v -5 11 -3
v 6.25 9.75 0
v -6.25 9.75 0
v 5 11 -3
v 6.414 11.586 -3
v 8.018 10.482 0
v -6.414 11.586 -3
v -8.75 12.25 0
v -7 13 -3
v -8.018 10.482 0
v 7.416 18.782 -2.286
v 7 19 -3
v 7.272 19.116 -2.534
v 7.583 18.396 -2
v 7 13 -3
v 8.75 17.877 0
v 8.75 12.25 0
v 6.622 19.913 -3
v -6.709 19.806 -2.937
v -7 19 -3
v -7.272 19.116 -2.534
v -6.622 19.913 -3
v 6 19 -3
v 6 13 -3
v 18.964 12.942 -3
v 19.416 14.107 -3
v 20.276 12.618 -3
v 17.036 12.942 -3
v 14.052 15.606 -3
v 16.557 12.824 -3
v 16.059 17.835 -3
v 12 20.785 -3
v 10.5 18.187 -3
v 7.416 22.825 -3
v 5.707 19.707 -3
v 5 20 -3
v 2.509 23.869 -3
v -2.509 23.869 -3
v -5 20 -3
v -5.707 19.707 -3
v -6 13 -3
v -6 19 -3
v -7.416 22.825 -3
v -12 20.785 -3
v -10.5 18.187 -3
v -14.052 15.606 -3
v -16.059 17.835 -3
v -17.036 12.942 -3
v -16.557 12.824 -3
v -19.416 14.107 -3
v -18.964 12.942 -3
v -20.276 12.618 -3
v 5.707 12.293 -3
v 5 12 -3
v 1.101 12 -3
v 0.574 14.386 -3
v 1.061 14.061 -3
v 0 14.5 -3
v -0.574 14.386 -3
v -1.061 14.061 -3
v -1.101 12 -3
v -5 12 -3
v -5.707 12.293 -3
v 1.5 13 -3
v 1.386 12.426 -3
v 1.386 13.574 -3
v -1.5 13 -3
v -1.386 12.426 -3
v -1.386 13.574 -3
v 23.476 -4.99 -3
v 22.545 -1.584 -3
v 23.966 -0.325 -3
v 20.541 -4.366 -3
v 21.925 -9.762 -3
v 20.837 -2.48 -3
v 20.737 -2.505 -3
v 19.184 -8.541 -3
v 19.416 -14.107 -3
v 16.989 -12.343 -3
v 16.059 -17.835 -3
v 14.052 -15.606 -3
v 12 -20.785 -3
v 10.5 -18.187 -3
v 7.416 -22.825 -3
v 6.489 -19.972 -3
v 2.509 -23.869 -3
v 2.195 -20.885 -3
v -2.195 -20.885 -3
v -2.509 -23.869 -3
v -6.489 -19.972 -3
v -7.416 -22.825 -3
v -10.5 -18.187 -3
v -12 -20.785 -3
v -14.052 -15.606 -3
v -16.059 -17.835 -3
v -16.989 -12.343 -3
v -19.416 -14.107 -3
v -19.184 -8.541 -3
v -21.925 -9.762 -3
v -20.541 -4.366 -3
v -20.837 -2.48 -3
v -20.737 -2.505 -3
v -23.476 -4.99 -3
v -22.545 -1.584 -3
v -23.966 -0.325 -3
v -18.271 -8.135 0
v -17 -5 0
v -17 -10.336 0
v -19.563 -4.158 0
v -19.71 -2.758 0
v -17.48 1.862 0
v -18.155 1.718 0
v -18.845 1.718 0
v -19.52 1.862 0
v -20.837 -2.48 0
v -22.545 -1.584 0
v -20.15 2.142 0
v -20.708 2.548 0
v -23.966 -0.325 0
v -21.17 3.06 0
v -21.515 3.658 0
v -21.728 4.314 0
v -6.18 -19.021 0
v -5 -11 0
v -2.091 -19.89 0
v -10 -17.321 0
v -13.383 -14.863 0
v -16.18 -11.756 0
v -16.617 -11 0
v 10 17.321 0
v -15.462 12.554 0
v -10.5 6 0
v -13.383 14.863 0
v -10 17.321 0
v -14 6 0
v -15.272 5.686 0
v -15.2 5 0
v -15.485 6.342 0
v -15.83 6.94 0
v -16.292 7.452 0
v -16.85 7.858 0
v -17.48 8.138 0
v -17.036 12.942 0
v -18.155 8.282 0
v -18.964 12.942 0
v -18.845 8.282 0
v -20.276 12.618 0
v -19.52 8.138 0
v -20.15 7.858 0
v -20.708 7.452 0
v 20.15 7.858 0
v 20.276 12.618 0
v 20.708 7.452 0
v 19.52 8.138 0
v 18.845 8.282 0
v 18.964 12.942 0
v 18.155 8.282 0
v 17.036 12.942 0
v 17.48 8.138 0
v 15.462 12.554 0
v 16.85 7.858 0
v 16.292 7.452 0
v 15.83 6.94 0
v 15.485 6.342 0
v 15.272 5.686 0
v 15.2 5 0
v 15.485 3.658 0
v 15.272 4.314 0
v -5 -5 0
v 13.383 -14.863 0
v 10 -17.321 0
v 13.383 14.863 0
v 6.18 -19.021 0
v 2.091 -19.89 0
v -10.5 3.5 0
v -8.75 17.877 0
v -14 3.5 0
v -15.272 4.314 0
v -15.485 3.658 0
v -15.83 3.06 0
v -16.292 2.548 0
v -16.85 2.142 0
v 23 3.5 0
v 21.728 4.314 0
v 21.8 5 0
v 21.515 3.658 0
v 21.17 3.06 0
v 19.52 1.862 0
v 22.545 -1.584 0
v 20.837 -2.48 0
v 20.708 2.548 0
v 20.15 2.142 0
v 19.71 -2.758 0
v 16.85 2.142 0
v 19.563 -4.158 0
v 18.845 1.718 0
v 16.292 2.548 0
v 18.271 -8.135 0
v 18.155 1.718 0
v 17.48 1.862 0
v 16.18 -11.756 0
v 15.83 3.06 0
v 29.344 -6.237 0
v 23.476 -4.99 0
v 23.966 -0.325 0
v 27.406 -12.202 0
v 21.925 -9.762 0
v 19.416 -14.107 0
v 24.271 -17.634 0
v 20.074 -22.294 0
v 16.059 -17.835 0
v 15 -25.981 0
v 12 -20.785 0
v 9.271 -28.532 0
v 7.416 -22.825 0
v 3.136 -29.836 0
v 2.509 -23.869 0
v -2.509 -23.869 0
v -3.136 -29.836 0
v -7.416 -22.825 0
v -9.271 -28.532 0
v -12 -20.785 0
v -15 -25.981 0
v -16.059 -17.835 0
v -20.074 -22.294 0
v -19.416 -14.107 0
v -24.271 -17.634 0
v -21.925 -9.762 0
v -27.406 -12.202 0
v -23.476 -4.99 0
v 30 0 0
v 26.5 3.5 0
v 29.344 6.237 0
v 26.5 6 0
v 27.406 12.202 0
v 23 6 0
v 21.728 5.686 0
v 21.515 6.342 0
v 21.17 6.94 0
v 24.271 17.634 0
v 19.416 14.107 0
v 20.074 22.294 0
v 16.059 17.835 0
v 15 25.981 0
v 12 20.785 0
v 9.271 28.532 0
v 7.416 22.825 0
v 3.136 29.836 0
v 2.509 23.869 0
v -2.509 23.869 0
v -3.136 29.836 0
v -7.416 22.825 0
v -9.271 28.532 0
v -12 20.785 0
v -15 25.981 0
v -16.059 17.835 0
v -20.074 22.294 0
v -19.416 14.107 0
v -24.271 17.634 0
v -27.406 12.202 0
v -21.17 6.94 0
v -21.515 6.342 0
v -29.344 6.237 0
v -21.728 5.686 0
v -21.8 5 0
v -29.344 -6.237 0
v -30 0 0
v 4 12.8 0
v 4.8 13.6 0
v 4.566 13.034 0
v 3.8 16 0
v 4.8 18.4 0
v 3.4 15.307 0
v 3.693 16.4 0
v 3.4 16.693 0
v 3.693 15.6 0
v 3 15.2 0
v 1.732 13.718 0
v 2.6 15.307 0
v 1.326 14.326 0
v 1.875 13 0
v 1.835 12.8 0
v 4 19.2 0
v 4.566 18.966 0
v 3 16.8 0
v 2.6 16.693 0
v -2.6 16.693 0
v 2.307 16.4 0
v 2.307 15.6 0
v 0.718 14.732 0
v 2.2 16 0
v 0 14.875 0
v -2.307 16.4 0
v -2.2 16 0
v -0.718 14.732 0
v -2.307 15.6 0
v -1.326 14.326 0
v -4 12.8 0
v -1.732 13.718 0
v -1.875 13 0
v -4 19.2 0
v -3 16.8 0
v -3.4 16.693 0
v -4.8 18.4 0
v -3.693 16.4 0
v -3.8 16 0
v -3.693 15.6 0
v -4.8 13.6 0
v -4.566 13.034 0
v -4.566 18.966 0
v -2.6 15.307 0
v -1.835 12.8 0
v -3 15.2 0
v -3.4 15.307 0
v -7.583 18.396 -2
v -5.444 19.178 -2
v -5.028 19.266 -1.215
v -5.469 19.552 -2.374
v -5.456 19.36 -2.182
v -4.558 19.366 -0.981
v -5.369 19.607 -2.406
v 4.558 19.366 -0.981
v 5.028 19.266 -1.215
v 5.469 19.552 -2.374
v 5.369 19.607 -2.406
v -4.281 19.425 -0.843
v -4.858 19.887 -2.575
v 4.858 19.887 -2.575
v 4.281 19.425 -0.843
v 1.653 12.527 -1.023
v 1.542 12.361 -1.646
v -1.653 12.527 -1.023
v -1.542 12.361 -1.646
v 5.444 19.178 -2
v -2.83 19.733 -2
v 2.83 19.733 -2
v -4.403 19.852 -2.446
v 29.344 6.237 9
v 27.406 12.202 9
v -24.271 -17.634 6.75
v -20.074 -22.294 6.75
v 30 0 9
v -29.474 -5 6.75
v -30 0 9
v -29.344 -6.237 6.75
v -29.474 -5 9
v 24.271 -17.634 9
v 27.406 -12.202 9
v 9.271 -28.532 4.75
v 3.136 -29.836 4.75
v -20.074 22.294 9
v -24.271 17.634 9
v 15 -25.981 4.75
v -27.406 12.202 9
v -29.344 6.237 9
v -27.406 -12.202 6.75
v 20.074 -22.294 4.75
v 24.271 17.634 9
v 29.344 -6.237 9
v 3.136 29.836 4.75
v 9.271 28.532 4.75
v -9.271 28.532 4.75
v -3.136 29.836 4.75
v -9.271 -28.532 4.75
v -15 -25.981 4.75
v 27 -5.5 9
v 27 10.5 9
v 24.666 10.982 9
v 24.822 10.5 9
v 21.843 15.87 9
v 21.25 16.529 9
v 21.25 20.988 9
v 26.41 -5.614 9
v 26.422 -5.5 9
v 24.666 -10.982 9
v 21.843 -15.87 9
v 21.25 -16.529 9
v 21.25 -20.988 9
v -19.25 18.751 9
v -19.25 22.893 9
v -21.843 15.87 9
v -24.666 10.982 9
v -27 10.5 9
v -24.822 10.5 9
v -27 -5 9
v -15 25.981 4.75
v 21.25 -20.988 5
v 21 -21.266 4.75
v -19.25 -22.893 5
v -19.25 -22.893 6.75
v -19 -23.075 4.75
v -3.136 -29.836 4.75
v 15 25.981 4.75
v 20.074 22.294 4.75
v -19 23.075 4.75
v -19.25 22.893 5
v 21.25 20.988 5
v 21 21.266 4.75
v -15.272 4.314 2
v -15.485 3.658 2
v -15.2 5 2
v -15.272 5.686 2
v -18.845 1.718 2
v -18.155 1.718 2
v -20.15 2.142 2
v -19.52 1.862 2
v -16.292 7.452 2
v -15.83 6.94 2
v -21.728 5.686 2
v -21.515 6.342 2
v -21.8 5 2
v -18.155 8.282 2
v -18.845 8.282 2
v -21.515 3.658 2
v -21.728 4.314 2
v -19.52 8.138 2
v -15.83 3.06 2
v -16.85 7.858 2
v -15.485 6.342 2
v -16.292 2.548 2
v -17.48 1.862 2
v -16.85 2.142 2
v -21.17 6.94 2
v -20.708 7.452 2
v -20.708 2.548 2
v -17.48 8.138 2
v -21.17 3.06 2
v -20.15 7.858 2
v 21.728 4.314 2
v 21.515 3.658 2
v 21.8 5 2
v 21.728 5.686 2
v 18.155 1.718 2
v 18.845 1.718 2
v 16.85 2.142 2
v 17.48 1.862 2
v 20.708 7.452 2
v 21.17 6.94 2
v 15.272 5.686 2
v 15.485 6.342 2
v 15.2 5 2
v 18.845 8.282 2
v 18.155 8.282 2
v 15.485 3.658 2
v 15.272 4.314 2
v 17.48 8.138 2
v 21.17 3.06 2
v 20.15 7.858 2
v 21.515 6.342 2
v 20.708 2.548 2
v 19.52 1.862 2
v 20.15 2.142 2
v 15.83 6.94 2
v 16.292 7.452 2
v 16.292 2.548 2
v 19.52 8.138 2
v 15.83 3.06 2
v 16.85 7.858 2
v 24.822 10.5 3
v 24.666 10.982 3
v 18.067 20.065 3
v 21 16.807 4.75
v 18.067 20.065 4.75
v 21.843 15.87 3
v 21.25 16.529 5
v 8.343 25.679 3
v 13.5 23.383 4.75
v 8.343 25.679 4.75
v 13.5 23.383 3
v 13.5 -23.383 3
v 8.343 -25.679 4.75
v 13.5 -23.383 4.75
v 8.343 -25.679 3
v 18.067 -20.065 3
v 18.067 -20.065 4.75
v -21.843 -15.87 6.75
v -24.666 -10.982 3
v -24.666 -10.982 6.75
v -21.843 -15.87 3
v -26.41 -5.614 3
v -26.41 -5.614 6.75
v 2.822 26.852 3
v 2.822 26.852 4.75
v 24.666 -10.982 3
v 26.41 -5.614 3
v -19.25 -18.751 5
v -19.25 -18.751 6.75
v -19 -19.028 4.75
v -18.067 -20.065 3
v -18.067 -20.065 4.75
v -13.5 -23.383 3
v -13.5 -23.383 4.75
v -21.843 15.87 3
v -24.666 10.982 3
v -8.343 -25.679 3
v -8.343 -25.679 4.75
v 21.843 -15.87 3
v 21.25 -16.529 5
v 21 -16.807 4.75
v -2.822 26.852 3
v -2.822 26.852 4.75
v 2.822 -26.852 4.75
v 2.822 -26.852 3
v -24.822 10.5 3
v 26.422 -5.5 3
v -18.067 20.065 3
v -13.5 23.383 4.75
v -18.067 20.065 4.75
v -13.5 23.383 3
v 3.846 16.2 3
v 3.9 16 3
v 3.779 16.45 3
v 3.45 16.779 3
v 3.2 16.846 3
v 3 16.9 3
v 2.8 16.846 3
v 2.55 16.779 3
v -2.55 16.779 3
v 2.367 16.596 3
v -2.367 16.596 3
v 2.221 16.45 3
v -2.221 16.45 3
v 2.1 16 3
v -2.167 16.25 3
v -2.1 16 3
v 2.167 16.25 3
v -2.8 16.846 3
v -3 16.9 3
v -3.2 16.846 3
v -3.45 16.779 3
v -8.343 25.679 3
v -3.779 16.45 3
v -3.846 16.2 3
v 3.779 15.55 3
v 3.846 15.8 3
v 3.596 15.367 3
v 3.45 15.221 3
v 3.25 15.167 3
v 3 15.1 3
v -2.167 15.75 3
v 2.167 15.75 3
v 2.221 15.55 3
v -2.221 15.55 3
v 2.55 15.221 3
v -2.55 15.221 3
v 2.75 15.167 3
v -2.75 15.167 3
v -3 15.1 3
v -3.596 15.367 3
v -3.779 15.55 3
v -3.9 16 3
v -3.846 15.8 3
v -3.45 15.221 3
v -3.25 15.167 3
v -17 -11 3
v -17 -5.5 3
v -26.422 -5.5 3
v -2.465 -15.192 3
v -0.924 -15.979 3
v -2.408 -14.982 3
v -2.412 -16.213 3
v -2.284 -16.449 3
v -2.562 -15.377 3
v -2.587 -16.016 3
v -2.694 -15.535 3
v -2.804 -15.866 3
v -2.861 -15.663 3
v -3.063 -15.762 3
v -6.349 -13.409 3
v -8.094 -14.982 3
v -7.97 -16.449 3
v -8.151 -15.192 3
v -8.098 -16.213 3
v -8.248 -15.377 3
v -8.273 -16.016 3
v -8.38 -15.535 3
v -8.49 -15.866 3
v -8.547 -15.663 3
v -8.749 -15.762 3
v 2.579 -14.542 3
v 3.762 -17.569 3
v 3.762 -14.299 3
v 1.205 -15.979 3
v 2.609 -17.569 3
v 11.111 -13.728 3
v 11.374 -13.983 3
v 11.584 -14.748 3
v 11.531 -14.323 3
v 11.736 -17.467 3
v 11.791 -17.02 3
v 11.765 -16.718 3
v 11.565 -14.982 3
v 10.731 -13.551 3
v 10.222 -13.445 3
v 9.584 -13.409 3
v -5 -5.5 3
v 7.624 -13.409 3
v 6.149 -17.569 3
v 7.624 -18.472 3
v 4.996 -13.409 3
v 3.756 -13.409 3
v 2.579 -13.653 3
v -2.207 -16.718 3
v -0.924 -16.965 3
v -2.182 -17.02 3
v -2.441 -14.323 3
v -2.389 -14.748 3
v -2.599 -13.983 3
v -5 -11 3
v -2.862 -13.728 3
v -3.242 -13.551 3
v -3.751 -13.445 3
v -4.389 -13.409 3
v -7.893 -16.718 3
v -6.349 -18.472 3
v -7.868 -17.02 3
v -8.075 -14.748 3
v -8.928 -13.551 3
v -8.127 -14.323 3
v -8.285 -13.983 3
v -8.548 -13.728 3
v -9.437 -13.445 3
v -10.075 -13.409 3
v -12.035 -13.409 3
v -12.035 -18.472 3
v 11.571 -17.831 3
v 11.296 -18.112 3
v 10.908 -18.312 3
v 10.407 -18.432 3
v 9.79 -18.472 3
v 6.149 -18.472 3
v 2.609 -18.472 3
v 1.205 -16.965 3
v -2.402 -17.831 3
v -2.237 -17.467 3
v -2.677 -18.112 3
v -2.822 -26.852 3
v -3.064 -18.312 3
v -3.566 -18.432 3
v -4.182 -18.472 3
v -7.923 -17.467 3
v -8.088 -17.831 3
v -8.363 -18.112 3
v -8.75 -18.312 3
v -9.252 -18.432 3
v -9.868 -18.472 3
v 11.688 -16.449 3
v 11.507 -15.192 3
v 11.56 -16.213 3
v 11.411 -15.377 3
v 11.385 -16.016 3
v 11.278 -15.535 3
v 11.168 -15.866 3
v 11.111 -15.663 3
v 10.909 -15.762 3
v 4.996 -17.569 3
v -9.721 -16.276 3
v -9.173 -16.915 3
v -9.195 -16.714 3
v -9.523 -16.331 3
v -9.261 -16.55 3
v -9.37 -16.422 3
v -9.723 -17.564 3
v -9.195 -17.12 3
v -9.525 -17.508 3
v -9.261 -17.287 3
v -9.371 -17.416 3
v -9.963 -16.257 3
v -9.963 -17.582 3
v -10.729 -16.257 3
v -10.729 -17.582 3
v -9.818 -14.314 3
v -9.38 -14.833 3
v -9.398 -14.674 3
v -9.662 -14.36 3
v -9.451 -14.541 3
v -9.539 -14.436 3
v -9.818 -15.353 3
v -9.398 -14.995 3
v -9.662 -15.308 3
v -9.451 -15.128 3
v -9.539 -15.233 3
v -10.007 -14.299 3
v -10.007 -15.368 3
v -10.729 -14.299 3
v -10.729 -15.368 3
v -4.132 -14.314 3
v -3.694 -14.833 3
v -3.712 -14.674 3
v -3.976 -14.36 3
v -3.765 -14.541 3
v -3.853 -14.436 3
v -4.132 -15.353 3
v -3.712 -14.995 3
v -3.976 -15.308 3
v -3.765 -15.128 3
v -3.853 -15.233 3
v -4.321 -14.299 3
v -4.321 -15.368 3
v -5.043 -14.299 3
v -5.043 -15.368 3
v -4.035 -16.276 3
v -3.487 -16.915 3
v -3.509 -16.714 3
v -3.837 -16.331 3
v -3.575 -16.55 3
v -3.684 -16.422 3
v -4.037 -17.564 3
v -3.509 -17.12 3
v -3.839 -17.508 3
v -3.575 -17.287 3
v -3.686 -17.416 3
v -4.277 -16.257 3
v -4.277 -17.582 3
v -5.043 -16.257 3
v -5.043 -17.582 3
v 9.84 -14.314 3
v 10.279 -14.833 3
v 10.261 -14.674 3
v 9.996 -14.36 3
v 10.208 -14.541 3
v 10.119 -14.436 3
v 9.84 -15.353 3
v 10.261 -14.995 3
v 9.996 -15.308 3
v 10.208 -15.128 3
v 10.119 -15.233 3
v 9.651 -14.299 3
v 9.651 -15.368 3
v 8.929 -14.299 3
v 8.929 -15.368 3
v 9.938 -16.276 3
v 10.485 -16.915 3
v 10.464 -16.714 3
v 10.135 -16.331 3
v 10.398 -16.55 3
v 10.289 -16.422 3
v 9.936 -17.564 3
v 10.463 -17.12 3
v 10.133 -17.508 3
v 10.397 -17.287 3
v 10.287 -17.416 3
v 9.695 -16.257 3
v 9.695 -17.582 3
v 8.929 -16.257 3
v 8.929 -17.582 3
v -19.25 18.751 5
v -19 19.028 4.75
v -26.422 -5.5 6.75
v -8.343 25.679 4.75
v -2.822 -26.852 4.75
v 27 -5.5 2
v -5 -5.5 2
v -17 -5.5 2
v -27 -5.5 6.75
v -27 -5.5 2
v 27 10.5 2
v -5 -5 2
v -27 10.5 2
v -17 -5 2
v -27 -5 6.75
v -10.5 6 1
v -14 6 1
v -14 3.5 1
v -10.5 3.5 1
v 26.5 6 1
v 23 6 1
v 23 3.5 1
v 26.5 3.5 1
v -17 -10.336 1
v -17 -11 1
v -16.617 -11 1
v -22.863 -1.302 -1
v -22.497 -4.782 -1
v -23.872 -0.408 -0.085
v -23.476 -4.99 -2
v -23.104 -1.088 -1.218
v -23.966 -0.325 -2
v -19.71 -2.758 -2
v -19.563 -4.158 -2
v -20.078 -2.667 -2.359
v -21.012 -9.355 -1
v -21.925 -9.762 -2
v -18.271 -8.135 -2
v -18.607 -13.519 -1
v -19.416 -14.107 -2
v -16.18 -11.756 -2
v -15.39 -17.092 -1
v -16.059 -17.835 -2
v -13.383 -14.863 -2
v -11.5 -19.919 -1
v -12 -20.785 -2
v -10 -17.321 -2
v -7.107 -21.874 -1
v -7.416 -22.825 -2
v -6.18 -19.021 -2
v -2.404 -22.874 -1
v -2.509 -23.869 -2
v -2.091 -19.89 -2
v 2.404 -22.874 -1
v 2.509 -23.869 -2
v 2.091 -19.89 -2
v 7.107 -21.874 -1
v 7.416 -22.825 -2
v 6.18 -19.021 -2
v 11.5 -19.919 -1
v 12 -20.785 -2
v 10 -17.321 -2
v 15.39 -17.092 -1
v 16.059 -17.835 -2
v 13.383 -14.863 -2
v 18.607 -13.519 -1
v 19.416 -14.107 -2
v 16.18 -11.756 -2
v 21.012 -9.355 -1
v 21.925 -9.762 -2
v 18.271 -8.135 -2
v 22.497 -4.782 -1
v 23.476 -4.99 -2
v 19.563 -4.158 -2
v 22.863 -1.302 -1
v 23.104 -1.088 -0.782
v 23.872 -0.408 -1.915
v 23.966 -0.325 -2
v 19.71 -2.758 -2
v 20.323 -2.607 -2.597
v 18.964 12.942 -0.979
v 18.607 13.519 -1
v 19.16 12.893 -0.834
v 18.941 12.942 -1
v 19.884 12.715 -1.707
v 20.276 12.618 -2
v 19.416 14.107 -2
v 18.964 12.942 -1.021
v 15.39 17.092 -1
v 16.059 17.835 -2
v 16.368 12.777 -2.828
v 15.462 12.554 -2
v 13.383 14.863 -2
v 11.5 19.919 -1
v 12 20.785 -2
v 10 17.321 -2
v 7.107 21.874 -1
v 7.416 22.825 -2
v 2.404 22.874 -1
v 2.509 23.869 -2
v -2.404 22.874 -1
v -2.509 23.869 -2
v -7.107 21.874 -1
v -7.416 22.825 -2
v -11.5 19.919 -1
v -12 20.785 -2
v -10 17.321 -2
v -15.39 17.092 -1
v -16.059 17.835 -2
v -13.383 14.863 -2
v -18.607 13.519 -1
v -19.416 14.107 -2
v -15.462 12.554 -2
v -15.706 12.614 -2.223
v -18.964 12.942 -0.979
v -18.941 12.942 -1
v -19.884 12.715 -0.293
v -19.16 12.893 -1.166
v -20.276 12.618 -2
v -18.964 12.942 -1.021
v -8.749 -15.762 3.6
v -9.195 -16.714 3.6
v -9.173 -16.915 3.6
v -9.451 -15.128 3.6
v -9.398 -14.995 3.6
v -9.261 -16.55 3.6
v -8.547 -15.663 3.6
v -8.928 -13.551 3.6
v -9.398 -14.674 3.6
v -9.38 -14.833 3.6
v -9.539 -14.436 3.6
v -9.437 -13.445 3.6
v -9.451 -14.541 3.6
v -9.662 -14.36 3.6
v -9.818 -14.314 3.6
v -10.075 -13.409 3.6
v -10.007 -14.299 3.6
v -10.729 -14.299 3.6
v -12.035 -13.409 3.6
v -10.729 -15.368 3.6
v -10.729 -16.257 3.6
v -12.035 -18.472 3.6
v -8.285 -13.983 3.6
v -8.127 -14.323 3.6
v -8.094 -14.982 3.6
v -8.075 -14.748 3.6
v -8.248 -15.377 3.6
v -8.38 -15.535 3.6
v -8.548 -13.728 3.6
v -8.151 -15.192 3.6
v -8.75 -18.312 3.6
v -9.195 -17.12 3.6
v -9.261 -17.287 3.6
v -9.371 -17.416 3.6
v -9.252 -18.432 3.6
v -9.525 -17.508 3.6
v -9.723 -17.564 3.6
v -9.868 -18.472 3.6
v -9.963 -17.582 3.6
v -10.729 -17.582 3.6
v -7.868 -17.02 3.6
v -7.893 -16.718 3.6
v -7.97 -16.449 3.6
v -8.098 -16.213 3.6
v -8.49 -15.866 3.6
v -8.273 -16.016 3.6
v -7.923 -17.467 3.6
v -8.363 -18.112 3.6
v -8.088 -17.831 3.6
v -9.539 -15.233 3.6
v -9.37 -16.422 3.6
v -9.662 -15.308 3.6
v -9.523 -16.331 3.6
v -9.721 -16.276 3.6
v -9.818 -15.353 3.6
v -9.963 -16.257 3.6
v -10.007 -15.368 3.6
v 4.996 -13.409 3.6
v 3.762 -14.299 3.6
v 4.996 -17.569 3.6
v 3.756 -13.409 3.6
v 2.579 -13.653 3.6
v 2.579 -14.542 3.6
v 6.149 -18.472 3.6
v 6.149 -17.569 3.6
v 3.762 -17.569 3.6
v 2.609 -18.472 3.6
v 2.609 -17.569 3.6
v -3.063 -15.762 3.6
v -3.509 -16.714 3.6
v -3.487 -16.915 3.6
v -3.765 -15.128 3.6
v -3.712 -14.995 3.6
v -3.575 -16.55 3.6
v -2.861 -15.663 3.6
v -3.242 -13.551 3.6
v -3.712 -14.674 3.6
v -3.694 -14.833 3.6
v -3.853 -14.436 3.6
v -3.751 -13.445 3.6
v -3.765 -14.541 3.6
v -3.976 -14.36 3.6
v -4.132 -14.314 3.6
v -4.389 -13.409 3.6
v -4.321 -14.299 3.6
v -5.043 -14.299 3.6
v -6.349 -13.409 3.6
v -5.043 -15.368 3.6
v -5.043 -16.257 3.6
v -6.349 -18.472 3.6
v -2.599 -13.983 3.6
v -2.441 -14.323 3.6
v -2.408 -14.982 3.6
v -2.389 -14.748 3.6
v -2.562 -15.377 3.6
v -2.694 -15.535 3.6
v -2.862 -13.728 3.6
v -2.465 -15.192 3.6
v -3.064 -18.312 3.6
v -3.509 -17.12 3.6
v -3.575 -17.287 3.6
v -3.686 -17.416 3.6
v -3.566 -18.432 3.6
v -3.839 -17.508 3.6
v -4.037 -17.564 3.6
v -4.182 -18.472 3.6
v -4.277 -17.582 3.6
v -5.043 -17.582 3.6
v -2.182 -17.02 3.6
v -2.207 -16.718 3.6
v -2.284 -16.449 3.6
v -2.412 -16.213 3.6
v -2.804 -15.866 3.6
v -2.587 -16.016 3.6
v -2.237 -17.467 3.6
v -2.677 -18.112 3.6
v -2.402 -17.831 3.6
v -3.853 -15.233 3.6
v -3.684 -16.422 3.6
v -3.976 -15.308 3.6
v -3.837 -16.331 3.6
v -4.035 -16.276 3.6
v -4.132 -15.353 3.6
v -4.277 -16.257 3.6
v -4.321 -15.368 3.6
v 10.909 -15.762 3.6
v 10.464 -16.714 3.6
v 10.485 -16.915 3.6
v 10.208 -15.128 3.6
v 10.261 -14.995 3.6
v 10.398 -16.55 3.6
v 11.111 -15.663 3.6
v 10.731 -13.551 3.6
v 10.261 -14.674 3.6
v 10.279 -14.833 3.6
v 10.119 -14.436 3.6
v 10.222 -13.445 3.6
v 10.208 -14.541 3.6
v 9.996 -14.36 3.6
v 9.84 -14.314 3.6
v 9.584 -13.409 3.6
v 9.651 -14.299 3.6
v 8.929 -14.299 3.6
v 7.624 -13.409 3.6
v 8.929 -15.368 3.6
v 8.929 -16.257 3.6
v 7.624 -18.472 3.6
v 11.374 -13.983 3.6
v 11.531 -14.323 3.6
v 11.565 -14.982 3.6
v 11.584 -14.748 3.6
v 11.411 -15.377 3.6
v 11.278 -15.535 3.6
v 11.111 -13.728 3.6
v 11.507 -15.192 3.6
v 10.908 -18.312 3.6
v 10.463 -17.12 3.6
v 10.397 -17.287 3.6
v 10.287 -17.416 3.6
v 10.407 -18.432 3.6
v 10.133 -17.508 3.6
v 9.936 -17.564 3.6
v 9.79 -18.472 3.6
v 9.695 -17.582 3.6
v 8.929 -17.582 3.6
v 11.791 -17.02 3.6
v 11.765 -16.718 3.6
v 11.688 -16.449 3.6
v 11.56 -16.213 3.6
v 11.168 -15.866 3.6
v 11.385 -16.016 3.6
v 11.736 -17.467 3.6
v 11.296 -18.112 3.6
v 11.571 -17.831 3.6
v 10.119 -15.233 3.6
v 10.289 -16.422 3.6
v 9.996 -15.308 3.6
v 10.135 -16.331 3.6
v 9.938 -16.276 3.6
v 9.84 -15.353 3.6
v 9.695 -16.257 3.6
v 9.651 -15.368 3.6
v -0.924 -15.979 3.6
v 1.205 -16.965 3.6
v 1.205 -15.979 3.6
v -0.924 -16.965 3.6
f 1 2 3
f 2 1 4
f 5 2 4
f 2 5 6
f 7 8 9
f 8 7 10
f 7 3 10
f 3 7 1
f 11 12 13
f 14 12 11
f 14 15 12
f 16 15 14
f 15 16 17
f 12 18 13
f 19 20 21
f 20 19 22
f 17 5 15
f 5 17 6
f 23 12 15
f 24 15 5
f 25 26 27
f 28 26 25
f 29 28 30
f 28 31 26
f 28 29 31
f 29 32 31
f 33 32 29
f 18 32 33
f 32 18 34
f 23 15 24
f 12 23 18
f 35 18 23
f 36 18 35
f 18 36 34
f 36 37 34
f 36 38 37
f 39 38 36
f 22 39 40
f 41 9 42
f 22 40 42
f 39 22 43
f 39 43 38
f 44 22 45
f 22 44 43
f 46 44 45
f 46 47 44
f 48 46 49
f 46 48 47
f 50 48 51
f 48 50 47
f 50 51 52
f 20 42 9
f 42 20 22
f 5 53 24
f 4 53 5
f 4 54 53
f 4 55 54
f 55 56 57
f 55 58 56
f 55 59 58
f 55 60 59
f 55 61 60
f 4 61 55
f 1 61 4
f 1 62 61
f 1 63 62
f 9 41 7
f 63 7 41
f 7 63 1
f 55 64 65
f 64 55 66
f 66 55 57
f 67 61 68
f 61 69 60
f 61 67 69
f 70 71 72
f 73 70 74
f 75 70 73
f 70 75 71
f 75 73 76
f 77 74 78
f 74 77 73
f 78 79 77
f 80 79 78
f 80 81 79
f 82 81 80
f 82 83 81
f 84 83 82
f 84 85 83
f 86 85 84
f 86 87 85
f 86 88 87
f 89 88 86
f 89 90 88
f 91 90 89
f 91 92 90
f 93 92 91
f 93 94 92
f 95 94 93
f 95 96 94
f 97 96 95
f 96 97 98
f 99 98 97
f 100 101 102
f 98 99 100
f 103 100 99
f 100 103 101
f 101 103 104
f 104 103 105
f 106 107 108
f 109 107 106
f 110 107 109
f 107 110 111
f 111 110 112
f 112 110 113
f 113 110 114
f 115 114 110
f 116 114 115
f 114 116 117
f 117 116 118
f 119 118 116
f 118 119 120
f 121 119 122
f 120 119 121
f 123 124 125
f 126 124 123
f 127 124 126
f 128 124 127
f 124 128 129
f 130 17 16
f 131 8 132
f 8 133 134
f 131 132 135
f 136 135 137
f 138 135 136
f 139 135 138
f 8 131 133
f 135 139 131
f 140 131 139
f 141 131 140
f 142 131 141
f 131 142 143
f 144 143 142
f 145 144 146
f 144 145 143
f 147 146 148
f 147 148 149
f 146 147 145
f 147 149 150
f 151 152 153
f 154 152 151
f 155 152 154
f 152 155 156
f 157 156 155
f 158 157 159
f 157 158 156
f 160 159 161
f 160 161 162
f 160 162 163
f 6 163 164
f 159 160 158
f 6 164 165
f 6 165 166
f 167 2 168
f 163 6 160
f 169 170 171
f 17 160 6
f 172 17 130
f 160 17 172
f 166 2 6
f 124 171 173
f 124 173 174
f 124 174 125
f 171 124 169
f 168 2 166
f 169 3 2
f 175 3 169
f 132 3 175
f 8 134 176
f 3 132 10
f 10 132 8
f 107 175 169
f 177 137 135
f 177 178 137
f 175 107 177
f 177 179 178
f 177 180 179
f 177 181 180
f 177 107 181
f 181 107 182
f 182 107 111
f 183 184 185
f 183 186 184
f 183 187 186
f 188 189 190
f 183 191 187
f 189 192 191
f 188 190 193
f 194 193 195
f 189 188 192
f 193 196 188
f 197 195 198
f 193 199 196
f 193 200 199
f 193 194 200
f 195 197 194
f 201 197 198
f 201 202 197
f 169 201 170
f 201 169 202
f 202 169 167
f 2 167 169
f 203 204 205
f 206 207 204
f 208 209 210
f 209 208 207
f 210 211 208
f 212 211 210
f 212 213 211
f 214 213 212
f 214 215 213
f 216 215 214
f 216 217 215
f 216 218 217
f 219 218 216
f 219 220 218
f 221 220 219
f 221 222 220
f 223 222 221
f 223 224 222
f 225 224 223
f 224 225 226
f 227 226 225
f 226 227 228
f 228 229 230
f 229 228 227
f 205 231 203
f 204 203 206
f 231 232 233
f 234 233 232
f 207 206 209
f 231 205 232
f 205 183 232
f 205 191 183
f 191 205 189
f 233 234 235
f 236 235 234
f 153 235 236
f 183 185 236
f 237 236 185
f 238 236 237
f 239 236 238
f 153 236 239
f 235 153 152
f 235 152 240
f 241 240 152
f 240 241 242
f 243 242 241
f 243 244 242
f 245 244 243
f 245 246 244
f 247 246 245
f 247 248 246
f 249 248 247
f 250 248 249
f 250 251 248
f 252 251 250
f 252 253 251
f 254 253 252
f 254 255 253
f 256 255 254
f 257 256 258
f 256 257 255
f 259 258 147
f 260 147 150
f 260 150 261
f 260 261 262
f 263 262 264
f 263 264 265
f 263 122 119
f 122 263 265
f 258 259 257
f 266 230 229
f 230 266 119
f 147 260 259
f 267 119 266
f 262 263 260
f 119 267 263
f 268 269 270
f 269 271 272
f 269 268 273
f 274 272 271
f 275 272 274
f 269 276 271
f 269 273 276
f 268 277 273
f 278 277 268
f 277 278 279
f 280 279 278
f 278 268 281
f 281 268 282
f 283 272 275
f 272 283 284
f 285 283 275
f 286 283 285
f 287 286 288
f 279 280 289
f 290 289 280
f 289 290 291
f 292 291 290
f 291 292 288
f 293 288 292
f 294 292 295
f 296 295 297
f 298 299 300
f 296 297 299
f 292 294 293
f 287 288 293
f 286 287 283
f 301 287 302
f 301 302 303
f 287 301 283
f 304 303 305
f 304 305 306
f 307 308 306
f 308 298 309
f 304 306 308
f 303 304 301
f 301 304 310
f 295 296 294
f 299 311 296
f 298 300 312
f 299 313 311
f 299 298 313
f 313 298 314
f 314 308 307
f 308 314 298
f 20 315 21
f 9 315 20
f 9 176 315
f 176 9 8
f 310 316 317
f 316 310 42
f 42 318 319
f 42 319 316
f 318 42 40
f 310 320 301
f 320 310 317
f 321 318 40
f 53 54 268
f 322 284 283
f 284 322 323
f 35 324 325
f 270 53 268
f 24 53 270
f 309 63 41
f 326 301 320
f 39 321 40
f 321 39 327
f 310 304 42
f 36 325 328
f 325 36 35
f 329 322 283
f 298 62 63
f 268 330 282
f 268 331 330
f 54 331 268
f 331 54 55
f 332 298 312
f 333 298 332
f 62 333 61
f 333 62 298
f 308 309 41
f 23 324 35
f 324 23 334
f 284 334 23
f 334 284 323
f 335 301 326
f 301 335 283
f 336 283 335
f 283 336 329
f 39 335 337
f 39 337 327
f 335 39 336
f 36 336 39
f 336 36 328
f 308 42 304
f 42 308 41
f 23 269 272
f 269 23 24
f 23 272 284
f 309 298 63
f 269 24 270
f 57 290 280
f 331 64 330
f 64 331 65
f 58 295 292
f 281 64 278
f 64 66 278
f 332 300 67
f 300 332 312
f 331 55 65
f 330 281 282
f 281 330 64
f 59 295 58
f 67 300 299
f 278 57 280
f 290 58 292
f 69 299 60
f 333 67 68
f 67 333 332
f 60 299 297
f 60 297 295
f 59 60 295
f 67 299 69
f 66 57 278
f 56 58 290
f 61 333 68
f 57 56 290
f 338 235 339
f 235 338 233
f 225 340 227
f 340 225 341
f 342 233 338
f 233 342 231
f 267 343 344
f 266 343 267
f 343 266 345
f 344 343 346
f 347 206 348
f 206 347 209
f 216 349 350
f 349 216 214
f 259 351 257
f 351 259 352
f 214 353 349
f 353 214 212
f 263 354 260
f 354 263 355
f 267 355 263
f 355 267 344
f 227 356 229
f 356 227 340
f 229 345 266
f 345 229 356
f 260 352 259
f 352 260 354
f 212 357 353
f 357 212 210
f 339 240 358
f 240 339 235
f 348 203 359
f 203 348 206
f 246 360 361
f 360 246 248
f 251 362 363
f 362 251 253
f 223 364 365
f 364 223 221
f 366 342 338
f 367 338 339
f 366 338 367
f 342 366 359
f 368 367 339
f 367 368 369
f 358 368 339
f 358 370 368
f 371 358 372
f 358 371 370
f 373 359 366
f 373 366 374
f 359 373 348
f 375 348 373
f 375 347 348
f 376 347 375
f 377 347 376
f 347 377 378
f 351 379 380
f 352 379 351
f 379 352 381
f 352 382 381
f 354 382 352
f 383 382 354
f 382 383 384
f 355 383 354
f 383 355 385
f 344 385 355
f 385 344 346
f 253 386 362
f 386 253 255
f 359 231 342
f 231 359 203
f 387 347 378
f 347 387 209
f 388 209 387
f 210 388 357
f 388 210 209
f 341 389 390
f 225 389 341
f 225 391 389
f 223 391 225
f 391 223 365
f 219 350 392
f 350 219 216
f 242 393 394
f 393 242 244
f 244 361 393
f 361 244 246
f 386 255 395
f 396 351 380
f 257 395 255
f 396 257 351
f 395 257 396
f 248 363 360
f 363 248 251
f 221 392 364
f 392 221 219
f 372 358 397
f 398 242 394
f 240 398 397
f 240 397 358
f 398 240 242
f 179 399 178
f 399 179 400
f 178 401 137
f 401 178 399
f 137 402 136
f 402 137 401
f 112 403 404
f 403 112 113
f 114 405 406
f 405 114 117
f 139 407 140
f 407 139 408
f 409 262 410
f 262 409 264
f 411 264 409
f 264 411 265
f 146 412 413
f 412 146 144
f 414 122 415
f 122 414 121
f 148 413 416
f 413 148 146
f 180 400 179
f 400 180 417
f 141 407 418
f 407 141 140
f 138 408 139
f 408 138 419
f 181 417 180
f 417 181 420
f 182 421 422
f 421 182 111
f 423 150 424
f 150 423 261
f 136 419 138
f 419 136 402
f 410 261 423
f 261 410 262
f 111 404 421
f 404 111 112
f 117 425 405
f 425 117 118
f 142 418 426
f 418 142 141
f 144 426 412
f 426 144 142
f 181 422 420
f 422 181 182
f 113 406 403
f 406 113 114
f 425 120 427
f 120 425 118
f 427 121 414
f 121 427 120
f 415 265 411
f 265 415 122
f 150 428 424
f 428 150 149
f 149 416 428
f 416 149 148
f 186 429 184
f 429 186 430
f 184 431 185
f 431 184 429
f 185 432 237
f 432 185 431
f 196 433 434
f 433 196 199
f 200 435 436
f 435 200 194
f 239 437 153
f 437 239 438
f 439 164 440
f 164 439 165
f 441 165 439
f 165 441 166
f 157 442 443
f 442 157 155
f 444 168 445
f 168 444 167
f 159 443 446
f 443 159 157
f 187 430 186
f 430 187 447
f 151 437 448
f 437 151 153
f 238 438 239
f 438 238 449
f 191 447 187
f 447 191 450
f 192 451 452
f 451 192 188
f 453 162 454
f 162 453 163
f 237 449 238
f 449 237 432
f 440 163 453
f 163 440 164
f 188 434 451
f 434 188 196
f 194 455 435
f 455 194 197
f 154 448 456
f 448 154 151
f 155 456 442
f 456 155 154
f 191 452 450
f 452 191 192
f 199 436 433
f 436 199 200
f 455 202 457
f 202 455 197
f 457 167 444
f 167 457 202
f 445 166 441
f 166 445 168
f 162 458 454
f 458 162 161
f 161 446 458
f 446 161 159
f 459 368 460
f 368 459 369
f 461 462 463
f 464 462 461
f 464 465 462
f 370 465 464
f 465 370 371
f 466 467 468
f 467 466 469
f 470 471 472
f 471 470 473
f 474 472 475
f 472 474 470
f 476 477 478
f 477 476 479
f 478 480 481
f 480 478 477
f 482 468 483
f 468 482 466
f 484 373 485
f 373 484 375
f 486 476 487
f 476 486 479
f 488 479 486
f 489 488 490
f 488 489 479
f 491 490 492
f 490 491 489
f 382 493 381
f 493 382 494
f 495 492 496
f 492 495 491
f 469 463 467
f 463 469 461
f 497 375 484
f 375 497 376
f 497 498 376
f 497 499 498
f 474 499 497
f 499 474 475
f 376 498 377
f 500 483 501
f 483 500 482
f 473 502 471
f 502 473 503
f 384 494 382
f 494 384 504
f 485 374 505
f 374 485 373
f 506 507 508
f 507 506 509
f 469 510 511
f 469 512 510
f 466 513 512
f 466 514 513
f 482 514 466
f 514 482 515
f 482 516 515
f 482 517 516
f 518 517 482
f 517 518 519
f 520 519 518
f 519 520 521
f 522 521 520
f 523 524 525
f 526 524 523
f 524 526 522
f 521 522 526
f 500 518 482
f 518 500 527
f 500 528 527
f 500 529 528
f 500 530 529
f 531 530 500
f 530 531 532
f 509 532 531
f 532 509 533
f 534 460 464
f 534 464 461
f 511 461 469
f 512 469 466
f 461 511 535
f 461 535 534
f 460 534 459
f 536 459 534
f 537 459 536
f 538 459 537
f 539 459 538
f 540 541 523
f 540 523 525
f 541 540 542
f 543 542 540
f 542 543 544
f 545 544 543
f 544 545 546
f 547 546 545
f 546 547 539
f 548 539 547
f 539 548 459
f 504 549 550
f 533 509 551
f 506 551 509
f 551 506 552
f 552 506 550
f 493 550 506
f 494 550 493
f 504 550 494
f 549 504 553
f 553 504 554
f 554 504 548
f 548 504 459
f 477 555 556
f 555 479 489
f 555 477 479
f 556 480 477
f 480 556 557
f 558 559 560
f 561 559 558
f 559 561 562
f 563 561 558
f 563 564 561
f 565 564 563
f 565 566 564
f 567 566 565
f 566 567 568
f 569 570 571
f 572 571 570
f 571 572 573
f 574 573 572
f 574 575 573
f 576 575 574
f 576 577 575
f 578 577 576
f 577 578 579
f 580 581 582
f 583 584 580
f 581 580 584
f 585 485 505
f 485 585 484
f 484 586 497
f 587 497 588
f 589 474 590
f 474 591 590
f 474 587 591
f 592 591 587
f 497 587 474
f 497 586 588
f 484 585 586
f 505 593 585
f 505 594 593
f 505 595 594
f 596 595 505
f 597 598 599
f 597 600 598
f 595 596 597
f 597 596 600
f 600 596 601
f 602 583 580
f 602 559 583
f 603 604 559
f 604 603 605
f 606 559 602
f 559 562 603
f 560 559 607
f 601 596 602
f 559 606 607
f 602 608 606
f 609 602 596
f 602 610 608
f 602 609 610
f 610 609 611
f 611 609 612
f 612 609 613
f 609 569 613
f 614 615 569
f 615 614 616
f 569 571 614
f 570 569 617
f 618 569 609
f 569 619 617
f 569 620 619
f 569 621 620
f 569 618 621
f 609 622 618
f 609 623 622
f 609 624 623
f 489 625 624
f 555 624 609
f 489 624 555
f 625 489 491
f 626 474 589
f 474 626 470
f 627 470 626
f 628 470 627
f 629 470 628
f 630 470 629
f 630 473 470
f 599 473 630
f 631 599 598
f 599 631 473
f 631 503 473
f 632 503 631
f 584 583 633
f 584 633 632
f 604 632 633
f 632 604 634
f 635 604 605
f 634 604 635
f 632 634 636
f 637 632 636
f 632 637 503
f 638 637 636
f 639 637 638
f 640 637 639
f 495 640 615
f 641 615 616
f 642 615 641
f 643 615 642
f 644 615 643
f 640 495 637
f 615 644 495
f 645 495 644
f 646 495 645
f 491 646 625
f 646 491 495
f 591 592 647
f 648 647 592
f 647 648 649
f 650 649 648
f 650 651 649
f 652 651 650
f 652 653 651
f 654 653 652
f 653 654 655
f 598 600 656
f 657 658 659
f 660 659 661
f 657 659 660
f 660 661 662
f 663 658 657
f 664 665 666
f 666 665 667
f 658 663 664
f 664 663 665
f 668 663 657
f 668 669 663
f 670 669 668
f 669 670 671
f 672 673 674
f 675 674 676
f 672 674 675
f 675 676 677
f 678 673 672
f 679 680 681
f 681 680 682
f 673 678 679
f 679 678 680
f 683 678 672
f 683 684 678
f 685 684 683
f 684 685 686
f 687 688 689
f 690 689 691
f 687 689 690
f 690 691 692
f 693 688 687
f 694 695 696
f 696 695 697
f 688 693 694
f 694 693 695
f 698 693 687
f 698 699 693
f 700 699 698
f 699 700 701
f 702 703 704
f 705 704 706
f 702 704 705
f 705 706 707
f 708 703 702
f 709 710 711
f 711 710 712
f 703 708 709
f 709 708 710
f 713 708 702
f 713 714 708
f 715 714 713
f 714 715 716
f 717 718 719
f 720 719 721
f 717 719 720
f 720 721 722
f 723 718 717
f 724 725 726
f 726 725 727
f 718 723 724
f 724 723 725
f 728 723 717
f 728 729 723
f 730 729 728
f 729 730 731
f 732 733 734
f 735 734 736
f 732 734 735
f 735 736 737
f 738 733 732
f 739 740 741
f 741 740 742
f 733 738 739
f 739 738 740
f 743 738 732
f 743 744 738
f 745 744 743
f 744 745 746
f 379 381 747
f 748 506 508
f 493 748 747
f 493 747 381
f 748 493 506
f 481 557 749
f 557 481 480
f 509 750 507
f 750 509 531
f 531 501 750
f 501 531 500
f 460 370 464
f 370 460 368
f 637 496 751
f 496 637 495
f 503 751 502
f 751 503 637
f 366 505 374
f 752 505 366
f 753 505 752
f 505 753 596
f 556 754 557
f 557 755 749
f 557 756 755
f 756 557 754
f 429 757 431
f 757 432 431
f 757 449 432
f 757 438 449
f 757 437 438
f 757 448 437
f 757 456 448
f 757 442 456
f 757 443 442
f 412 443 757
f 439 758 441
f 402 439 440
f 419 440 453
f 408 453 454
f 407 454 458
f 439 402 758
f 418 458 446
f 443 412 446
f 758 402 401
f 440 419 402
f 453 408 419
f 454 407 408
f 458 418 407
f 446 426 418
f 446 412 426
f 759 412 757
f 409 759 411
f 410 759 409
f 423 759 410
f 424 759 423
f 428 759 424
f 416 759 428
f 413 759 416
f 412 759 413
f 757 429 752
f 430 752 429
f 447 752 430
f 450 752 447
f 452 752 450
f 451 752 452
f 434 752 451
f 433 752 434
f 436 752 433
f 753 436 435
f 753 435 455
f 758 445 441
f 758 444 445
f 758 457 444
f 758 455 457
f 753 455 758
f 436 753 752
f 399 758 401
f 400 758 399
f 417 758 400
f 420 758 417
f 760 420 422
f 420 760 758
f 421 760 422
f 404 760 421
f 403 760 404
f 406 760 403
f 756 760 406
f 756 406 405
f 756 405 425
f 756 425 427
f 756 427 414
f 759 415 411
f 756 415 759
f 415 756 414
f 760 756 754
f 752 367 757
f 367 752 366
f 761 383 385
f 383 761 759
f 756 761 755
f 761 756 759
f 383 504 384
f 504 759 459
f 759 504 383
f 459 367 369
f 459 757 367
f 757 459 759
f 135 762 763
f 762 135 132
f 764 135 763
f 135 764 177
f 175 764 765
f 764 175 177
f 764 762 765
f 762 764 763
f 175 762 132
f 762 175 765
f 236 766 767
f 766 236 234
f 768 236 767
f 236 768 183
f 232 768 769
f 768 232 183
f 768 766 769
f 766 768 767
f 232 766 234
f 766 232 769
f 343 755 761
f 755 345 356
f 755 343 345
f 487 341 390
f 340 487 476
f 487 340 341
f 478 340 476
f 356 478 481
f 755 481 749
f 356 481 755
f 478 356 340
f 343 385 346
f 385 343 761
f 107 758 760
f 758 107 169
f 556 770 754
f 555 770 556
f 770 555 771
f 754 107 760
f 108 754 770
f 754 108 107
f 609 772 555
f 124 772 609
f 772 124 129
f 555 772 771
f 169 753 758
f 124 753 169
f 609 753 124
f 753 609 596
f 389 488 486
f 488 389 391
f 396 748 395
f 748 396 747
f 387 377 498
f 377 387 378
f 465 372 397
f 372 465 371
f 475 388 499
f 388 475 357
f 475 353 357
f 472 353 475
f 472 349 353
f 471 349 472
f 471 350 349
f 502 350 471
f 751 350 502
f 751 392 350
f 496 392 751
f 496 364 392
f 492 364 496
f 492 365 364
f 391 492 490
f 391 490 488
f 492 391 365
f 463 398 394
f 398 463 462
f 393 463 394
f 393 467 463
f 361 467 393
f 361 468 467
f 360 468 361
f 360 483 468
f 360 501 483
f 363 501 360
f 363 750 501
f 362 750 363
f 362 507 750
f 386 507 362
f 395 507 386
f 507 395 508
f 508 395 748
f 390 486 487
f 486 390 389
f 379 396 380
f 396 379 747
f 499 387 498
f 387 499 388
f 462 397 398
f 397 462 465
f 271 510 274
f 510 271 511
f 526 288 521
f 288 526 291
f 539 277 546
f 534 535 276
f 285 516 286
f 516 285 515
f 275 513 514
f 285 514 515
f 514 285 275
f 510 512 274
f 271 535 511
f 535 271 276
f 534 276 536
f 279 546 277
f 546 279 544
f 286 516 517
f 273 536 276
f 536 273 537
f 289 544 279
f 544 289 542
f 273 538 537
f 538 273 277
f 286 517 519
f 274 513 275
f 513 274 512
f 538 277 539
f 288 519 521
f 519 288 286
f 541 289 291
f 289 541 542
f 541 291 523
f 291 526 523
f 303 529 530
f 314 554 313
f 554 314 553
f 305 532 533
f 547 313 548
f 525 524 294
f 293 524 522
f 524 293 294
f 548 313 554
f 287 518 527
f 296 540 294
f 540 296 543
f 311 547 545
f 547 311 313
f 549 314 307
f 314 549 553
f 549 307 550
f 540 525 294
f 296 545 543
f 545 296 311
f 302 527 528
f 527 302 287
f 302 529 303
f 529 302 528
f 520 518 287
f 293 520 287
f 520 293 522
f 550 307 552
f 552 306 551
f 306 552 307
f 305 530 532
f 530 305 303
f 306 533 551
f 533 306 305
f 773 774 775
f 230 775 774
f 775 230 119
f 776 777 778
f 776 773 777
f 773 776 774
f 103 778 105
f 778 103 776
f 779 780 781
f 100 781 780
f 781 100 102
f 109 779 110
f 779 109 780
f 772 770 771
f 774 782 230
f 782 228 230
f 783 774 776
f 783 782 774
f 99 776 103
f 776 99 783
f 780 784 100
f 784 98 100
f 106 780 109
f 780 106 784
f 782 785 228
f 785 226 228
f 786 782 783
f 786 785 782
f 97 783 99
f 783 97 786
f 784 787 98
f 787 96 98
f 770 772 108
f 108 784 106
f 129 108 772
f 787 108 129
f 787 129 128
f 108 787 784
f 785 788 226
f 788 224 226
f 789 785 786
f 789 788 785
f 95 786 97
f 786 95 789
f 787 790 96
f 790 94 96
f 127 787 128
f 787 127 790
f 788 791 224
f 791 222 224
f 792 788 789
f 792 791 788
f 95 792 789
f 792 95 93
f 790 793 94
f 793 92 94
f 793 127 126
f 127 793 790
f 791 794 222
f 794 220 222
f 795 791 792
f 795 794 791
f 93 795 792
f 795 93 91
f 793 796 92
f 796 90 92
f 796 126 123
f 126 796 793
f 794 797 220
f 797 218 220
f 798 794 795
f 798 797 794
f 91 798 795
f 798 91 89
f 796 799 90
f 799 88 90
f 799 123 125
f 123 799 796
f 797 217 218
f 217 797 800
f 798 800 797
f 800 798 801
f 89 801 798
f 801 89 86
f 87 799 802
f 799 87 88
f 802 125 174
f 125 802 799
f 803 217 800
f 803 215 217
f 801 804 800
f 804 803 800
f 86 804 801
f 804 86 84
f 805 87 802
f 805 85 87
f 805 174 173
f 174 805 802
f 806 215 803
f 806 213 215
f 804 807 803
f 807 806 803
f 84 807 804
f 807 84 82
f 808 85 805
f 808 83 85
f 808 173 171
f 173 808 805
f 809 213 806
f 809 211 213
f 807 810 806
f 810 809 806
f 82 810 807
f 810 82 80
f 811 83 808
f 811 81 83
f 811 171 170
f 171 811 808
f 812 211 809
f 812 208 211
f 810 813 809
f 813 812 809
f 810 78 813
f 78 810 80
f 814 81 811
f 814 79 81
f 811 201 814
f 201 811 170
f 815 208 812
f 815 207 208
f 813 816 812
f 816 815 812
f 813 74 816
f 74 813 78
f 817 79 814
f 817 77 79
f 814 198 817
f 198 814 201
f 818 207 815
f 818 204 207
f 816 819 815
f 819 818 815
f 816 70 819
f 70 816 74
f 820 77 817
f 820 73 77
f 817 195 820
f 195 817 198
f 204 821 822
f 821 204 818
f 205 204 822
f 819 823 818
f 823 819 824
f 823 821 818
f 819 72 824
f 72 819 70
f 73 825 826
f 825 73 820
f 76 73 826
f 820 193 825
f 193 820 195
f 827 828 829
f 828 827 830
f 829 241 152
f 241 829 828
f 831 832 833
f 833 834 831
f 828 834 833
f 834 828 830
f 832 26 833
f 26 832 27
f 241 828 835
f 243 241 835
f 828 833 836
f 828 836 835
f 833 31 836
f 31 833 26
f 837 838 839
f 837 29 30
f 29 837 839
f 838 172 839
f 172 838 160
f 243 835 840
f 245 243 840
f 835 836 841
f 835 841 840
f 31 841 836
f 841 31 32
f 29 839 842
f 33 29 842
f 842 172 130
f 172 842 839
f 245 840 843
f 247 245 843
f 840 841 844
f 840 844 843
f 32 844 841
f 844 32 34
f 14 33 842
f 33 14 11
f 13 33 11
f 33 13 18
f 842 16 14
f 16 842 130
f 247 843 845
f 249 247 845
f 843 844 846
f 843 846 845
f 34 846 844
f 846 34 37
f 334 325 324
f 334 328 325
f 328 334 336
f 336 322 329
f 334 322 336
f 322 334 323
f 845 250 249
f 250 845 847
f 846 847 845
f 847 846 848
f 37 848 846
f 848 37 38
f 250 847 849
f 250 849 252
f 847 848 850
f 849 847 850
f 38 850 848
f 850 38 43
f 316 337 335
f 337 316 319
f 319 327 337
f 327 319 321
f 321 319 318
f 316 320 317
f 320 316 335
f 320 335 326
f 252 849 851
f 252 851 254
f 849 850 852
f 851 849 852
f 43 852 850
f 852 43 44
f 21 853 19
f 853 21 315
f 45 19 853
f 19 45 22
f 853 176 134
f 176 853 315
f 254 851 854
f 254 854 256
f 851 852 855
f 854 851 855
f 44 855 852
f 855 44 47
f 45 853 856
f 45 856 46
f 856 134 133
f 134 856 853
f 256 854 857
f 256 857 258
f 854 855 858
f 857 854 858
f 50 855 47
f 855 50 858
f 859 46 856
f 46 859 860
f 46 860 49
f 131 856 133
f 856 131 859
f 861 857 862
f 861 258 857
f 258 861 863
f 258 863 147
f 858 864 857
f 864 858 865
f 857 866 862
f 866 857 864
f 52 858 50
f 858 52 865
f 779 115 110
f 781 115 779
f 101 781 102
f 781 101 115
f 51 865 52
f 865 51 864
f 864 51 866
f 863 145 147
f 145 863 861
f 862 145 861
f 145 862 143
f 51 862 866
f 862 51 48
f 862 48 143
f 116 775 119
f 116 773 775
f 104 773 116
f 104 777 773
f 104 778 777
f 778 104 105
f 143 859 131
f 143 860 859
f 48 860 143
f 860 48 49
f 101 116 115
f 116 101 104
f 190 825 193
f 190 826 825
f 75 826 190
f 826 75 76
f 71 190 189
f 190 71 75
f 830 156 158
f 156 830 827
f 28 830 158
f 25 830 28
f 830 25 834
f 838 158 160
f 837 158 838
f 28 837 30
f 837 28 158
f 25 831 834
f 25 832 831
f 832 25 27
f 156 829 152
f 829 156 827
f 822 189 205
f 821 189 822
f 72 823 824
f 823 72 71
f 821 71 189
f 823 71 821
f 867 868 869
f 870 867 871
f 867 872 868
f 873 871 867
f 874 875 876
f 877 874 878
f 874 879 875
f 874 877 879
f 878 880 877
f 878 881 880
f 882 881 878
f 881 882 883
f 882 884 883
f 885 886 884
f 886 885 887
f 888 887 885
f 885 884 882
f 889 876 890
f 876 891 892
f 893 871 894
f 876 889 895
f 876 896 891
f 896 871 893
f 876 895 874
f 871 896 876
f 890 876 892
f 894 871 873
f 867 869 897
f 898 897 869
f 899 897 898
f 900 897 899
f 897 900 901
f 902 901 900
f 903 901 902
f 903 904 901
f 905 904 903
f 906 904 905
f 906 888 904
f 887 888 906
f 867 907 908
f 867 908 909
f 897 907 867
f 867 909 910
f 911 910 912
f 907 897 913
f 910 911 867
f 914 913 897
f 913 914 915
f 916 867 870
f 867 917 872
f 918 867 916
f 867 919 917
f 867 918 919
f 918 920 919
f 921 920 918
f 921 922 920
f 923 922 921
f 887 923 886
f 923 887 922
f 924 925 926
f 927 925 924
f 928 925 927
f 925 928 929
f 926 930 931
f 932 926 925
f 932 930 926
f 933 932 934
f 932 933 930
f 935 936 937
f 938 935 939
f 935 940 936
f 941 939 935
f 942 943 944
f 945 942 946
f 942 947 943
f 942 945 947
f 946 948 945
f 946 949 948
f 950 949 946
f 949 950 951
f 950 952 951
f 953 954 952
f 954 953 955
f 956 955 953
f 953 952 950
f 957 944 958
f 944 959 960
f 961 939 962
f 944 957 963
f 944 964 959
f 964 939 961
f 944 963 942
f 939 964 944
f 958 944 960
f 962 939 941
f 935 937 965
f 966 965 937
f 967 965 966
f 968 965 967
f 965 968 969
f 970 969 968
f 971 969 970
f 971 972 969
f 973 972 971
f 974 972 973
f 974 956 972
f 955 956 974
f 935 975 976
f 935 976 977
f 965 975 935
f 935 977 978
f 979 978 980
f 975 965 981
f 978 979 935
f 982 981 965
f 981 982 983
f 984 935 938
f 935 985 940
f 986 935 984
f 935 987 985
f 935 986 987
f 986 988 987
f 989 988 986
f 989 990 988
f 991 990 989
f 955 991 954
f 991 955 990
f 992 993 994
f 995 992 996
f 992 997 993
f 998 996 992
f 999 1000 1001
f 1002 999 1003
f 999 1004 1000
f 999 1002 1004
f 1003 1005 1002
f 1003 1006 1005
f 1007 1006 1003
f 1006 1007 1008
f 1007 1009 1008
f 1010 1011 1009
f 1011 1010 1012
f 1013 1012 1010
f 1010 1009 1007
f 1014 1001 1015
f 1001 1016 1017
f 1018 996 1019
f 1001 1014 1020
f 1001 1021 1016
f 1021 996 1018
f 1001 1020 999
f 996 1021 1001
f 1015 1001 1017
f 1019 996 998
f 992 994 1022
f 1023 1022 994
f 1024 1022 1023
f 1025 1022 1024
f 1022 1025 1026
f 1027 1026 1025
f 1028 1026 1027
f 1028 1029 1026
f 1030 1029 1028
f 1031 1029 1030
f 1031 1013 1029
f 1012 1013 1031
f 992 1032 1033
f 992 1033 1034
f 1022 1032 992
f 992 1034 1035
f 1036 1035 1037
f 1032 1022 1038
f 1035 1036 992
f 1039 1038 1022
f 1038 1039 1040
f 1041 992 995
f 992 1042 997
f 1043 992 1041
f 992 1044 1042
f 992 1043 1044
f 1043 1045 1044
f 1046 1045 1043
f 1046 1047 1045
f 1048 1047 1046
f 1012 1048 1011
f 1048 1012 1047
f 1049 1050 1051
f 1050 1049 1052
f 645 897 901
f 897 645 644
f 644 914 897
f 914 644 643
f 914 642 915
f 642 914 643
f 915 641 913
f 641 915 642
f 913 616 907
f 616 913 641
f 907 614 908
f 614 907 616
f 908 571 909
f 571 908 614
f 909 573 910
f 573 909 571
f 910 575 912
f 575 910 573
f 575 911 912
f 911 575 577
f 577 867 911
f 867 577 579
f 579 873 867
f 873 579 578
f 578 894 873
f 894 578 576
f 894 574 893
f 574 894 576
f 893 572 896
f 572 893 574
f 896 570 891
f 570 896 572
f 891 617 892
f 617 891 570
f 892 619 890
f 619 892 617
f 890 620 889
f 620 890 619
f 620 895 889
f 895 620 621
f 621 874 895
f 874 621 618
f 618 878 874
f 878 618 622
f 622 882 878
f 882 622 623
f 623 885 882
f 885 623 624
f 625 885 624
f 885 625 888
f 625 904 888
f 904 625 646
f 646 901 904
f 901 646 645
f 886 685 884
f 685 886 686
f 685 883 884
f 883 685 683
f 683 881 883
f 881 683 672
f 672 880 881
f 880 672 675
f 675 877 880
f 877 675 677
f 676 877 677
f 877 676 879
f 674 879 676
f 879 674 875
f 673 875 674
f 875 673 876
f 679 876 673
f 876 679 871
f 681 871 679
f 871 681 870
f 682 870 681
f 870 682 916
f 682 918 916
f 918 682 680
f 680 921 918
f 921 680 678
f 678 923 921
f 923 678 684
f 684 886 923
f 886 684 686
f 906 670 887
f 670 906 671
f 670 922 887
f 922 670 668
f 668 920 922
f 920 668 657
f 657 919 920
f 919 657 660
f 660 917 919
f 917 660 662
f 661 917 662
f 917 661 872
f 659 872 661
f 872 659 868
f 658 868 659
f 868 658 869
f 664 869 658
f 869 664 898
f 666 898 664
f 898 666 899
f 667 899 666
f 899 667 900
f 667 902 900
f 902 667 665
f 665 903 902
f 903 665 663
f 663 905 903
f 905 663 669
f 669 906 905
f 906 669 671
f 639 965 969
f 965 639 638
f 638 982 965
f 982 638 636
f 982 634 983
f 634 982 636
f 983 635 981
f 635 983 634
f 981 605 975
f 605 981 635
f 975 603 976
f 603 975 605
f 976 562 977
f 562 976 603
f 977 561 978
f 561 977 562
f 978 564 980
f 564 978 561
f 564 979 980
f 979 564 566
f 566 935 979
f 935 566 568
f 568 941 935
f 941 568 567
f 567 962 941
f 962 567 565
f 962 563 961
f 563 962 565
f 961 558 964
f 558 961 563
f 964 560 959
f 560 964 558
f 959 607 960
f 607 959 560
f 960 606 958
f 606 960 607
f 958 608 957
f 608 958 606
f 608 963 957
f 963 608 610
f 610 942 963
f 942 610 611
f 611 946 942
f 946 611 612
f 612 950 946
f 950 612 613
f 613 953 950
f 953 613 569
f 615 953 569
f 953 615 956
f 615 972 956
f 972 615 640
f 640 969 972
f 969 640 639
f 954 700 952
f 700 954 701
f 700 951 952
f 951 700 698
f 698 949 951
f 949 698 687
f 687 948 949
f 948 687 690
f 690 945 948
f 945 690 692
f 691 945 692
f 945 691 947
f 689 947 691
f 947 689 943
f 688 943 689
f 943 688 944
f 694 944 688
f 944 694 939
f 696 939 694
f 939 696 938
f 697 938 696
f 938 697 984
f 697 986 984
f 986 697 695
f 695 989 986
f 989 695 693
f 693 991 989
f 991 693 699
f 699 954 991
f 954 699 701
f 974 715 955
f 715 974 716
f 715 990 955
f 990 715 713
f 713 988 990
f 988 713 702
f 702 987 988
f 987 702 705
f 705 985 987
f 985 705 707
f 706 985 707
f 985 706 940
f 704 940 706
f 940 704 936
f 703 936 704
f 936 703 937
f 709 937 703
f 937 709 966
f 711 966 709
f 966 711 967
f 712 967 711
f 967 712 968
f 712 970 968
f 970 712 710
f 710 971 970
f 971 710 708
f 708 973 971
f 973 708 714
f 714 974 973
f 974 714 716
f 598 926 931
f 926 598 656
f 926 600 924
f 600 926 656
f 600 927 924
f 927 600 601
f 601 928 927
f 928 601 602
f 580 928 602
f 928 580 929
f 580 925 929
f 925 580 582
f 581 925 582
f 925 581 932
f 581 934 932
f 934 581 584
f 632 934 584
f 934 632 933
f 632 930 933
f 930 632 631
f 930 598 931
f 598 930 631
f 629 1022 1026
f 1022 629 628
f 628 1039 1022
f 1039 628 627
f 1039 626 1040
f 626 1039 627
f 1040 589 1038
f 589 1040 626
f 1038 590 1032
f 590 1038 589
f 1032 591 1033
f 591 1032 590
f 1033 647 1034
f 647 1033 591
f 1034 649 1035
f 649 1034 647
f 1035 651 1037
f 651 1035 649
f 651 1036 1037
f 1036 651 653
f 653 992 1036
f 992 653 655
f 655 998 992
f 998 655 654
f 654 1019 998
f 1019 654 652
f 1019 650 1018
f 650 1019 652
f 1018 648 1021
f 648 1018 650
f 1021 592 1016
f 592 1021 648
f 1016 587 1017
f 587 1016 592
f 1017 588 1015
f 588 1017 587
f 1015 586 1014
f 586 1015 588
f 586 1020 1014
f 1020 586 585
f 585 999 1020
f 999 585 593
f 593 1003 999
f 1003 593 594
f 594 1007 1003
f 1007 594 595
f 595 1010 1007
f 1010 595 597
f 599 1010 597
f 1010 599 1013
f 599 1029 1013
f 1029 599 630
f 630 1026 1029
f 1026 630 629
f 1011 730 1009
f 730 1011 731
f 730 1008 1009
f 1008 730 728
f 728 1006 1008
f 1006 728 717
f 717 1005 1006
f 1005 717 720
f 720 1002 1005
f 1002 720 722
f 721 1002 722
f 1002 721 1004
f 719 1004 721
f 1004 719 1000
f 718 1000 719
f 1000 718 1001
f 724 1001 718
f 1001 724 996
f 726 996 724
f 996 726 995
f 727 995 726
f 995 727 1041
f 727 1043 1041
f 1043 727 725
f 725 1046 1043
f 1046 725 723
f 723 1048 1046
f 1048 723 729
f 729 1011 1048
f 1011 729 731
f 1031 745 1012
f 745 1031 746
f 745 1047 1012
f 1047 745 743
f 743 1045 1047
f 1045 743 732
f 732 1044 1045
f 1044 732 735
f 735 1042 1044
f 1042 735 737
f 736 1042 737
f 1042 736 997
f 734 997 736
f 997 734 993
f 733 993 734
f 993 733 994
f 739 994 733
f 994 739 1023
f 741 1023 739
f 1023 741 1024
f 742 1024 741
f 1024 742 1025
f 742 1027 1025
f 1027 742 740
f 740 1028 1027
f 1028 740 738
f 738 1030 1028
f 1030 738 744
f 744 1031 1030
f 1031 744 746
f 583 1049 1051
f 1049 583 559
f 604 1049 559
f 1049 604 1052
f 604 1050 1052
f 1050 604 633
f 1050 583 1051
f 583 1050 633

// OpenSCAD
tol=0.25;

difference(){

// Base boss
    union(){
        translate([0,0,0]) color("yellow")
        linear_extrude(height=9)  circle(r=30,center=true);

        // This is the pogo pin surround
        translate([0,16,-3]) color("green"){
            difference(){
                linear_extrude(height=3,scale=1.25)
                offset(r=2,$fn=8) square(size=[10,6],center=true);

                linear_extrude(height=3,scale=0.8)
                offset(r=1,$fn=8) square(size=[10,6],center=true);
            }
            translate([0,-3,0]) color("orange")
            linear_extrude(height=3,scale=1.25)  circle(r=1.5,$fn=16,center=true);
        }
    }
    // holes for pogo pins
    translate([3,16,0]) cylinder(r1=0.8,r2=1.0,h=6,$fn=12);
    translate([-3,16,0]) cylinder(r1=0.8,r2=1.0,h=6,$fn=12);

    
// Simplified version of BB1a
    translate([-27,-1,2]) rotate([90,0,0])
    union(){
        translate([27,1,-1]) color("pink") rotate([-90,0,0])
        linear_extrude(height=65)  circle(r=27,center=true);

        // Base 1 plate
        B1p=[ [0,0], [54,0], [54,70], [44,80],
        [10,80], [0,70] ];
        translate([0,0,0]) color("gray")
        linear_extrude(height=4.5)
        polygon(points=B1p);

        // Switch mounts
        translate ([0,0,-11]) color("gray") 
            linear_extrude(height=11) 
            square(size=[54, 2]);
        
        // Bottom side outer rail  THICKENED 
        translate ([0,0,-11.5]) color("gray") 
            linear_extrude(height=11.5,convexity=100) polygon(points=B1p);
        
        // Switch 1
        translate([2,1.6,-11]) color("green"){
            union(){
                // switch body including solder lug clearance
                linear_extrude(height=12) 
                offset(r=tol)
                 square(size=[13, 15]);
                
                translate([6.5,0,5]) rotate([90,0,0]) cylinder(r=3.3,h=10,$fn=30);
            }
        }
        // Switch 2
        translate([54-15,1.6,-11]) color("blue"){
            union(){
                // switch body including solder lug clearance
                linear_extrude(height=12) 
                offset(r=tol)
                 square(size=[13, 15]);
                
                translate([6.5,0,5]) rotate([90,0,0]) cylinder(r=3.3,h=10,$fn=30);
            }
        }

        // anti rotate slot for switches
        translate([13,-2,-7]) color("green"){
                linear_extrude(height=2.5) 
                 square(size=[3.5, 1.0]);
        }
        translate([50,-2,-7]) color("blue"){
                linear_extrude(height=2.5) 
                 square(size=[3.5, 1.0]);
        }

        // add a block between switches for cutout
        translate([2,1.6,-11]) color("orange"){
            linear_extrude(height=12) 
            offset(r=tol)
             square(size=[50, 25]);
        }
        
        // extra block  cutout for the battery cable
        translate([-4,5,4]) color("pink"){
            linear_extrude(height=18) 
            offset(r=tol)
             square(size=[14, 14]);
        }
        
        // another cutout for the USB charger plug
        translate([10,-4,4]) color("red"){
            linear_extrude(height=6) square(size=[12, 10]);
        }
        
        // Front to back cut
        translate([8,3,-40]) color("cyan"){
            // switch body including solder lug clearance
            linear_extrude(height=80) 
            offset(r=tol)
             square(size=[40, 30]);
        }
        
        
    }  // end of BB1a union
} // end of top boss difference cuts   
    
difference(){
    // Bottom side boss
    pb1=[ [24,0], [20,0], [20,3], [21,4], [24,4], [24,3],
    [23,2], [24,1] ];
    translate([0,0,1]) rotate([180,0,0]) color("orange")
    rotate_extrude(convexity=20) polygon(points=pb1);

    // cutaways for access
        translate([-18,5,-4]) color("cyan"){
            cylinder(r=8,h=10);
        }
        translate([18,5,-4]) color("cyan"){
            cylinder(r=8,h=10);
        }
}    


// add text for Brights
translate ([0,-16,2.4]) rotate([0,0,0]) color("red") 
    linear_extrude(height=1.2){
    text("BB-1B", font = "Open Sans:style=Bold", size=5,halign="center",valign="center",spacing=1.1);
    }
